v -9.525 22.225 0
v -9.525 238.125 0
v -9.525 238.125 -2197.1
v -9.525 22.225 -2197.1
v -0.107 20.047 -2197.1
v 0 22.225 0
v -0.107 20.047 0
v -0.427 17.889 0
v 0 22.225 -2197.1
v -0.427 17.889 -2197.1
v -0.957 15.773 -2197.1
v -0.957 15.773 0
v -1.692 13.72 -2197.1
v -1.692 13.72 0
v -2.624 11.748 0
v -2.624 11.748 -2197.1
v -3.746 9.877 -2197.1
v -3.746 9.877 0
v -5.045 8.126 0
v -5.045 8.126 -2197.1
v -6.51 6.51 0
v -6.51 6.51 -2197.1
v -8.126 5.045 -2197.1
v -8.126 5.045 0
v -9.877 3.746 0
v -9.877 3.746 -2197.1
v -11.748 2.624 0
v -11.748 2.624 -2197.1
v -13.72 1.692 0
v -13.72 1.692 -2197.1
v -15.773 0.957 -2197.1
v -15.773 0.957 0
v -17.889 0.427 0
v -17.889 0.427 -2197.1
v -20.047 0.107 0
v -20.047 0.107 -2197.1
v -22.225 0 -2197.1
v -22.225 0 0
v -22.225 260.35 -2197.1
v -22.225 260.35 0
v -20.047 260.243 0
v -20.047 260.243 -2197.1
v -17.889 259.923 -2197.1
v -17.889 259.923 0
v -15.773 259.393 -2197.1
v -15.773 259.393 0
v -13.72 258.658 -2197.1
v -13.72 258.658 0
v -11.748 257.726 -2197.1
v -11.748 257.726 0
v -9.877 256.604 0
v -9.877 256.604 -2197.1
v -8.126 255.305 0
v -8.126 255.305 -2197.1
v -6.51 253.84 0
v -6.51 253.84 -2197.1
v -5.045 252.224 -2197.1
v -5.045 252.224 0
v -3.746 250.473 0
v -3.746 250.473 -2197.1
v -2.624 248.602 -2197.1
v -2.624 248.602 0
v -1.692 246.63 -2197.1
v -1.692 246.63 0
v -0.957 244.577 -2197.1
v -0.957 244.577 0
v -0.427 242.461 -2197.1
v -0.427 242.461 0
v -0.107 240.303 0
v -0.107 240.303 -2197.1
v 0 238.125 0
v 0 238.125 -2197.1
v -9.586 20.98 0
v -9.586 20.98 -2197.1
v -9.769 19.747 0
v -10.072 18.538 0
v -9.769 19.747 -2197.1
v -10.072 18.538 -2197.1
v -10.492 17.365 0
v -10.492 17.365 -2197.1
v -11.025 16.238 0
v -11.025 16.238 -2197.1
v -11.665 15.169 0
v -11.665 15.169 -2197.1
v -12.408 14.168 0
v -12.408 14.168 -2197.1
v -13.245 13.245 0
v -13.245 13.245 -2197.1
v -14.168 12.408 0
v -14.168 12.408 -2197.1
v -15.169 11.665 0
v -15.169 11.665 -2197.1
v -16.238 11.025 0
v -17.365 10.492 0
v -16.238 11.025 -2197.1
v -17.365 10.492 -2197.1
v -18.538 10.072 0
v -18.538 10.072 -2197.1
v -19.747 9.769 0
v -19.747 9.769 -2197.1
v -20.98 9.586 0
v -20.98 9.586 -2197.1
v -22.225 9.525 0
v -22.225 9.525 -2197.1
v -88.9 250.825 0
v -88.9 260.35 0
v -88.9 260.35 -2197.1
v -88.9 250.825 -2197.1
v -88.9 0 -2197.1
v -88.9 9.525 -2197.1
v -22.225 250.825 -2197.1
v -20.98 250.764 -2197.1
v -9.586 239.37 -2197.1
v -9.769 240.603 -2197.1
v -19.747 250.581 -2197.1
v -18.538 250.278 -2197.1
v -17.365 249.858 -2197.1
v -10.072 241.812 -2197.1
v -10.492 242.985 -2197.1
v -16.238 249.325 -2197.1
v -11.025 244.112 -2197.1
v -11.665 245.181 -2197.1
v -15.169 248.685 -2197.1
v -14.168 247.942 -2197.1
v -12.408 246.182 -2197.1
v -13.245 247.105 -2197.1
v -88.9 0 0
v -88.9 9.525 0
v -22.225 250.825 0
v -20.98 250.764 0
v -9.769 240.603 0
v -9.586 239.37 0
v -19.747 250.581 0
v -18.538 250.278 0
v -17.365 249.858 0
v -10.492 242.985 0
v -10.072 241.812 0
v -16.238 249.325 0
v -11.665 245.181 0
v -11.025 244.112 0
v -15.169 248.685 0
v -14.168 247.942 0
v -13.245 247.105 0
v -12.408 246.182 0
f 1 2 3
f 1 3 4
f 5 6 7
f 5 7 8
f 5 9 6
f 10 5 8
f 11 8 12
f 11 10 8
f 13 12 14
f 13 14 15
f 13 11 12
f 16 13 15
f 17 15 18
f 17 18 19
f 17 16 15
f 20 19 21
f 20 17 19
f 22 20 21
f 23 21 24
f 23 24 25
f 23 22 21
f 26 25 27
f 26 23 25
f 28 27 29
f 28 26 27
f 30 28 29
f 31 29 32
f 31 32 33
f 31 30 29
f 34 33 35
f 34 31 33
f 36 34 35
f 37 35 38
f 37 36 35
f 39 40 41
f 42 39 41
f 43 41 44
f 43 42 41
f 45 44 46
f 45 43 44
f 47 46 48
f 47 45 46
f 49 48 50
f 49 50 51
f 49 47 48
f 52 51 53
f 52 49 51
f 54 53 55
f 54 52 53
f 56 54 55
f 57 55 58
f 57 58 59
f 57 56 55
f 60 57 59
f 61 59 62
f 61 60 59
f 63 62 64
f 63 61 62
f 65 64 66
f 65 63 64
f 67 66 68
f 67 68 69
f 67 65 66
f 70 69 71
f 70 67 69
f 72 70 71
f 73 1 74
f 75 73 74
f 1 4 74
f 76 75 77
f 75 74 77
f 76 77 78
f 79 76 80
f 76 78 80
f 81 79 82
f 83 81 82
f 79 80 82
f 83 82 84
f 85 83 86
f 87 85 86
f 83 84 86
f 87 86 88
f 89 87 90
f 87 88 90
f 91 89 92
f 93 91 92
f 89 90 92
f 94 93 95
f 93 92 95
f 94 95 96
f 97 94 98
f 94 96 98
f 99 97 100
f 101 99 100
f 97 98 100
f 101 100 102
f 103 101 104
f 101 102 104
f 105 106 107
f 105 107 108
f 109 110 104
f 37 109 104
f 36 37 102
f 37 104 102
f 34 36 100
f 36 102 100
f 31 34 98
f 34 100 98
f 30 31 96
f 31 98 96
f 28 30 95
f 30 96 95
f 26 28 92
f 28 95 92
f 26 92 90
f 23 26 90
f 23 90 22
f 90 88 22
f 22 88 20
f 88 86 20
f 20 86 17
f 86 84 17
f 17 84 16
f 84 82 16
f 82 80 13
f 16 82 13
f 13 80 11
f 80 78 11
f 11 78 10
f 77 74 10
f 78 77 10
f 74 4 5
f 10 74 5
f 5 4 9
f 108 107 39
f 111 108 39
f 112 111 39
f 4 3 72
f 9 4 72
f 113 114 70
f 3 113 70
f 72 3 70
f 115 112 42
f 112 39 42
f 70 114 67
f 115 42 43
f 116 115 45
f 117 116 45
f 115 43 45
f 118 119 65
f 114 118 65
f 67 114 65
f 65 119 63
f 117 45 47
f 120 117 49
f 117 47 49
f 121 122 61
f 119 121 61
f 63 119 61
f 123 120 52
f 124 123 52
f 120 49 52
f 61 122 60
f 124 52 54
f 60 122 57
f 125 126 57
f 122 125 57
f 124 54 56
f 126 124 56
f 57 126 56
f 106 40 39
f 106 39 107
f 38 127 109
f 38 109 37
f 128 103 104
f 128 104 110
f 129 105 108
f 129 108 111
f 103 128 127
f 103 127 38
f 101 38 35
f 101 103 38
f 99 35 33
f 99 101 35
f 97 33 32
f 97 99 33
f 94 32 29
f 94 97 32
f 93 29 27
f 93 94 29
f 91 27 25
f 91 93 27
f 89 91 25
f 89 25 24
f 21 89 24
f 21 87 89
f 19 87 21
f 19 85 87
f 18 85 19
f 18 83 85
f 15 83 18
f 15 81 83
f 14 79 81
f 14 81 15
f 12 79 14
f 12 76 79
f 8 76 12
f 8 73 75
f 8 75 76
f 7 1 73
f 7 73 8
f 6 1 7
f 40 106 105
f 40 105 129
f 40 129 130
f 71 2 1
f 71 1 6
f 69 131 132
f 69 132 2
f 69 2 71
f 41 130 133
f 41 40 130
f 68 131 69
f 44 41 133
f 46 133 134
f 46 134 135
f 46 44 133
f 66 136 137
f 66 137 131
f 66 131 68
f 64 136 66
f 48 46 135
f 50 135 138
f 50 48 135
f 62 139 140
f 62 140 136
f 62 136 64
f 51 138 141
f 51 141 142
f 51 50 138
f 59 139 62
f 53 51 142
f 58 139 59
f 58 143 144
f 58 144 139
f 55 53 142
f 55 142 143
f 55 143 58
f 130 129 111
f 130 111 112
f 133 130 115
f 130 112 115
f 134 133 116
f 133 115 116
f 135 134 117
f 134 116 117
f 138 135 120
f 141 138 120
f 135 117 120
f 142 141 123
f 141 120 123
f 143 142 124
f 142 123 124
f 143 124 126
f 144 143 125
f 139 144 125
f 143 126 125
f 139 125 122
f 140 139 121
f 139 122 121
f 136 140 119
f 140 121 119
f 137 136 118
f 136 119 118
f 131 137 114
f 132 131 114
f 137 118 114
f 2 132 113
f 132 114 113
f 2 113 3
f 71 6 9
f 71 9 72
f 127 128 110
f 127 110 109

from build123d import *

# Parameters (mm, degrees)
BASE_EXTRUDE_THIN_DEPTH = 2197.1
INSIDE_BEND_RADIUS_R    = 12.7
OUTSIDE_BEND_RADIUS_R   = 22.225


with BuildPart() as part:
    # Sketch1 → Base-Extrude-Thin (new body)
    with BuildSketch(Plane.XY):
        Polygon((-88.9, 0), (0, 0), (0, 260.35), (-88.9, 260.35), (-88.9, 250.825), (-9.525, 250.825), (-9.525, 9.525), (-88.9, 9.525), align=None)
    extrude(amount=-BASE_EXTRUDE_THIN_DEPTH)

    # Inside Bend Radius
    inside_bend_radius_edges = [part.edges().sort_by_distance(p)[0] for p in [
        (-9.525, 250.825, -1098.55),
        (-9.525, 9.525, -1098.55),
    ]]
    fillet(inside_bend_radius_edges, radius=INSIDE_BEND_RADIUS_R)

    # Outside Bend Radius
    outside_bend_radius_edges = [part.edges().sort_by_distance(p)[0] for p in [
        (0, 0, -1098.55),
        (0, 260.35, -1098.55),
    ]]
    fillet(outside_bend_radius_edges, radius=OUTSIDE_BEND_RADIUS_R)


solid = part.part
